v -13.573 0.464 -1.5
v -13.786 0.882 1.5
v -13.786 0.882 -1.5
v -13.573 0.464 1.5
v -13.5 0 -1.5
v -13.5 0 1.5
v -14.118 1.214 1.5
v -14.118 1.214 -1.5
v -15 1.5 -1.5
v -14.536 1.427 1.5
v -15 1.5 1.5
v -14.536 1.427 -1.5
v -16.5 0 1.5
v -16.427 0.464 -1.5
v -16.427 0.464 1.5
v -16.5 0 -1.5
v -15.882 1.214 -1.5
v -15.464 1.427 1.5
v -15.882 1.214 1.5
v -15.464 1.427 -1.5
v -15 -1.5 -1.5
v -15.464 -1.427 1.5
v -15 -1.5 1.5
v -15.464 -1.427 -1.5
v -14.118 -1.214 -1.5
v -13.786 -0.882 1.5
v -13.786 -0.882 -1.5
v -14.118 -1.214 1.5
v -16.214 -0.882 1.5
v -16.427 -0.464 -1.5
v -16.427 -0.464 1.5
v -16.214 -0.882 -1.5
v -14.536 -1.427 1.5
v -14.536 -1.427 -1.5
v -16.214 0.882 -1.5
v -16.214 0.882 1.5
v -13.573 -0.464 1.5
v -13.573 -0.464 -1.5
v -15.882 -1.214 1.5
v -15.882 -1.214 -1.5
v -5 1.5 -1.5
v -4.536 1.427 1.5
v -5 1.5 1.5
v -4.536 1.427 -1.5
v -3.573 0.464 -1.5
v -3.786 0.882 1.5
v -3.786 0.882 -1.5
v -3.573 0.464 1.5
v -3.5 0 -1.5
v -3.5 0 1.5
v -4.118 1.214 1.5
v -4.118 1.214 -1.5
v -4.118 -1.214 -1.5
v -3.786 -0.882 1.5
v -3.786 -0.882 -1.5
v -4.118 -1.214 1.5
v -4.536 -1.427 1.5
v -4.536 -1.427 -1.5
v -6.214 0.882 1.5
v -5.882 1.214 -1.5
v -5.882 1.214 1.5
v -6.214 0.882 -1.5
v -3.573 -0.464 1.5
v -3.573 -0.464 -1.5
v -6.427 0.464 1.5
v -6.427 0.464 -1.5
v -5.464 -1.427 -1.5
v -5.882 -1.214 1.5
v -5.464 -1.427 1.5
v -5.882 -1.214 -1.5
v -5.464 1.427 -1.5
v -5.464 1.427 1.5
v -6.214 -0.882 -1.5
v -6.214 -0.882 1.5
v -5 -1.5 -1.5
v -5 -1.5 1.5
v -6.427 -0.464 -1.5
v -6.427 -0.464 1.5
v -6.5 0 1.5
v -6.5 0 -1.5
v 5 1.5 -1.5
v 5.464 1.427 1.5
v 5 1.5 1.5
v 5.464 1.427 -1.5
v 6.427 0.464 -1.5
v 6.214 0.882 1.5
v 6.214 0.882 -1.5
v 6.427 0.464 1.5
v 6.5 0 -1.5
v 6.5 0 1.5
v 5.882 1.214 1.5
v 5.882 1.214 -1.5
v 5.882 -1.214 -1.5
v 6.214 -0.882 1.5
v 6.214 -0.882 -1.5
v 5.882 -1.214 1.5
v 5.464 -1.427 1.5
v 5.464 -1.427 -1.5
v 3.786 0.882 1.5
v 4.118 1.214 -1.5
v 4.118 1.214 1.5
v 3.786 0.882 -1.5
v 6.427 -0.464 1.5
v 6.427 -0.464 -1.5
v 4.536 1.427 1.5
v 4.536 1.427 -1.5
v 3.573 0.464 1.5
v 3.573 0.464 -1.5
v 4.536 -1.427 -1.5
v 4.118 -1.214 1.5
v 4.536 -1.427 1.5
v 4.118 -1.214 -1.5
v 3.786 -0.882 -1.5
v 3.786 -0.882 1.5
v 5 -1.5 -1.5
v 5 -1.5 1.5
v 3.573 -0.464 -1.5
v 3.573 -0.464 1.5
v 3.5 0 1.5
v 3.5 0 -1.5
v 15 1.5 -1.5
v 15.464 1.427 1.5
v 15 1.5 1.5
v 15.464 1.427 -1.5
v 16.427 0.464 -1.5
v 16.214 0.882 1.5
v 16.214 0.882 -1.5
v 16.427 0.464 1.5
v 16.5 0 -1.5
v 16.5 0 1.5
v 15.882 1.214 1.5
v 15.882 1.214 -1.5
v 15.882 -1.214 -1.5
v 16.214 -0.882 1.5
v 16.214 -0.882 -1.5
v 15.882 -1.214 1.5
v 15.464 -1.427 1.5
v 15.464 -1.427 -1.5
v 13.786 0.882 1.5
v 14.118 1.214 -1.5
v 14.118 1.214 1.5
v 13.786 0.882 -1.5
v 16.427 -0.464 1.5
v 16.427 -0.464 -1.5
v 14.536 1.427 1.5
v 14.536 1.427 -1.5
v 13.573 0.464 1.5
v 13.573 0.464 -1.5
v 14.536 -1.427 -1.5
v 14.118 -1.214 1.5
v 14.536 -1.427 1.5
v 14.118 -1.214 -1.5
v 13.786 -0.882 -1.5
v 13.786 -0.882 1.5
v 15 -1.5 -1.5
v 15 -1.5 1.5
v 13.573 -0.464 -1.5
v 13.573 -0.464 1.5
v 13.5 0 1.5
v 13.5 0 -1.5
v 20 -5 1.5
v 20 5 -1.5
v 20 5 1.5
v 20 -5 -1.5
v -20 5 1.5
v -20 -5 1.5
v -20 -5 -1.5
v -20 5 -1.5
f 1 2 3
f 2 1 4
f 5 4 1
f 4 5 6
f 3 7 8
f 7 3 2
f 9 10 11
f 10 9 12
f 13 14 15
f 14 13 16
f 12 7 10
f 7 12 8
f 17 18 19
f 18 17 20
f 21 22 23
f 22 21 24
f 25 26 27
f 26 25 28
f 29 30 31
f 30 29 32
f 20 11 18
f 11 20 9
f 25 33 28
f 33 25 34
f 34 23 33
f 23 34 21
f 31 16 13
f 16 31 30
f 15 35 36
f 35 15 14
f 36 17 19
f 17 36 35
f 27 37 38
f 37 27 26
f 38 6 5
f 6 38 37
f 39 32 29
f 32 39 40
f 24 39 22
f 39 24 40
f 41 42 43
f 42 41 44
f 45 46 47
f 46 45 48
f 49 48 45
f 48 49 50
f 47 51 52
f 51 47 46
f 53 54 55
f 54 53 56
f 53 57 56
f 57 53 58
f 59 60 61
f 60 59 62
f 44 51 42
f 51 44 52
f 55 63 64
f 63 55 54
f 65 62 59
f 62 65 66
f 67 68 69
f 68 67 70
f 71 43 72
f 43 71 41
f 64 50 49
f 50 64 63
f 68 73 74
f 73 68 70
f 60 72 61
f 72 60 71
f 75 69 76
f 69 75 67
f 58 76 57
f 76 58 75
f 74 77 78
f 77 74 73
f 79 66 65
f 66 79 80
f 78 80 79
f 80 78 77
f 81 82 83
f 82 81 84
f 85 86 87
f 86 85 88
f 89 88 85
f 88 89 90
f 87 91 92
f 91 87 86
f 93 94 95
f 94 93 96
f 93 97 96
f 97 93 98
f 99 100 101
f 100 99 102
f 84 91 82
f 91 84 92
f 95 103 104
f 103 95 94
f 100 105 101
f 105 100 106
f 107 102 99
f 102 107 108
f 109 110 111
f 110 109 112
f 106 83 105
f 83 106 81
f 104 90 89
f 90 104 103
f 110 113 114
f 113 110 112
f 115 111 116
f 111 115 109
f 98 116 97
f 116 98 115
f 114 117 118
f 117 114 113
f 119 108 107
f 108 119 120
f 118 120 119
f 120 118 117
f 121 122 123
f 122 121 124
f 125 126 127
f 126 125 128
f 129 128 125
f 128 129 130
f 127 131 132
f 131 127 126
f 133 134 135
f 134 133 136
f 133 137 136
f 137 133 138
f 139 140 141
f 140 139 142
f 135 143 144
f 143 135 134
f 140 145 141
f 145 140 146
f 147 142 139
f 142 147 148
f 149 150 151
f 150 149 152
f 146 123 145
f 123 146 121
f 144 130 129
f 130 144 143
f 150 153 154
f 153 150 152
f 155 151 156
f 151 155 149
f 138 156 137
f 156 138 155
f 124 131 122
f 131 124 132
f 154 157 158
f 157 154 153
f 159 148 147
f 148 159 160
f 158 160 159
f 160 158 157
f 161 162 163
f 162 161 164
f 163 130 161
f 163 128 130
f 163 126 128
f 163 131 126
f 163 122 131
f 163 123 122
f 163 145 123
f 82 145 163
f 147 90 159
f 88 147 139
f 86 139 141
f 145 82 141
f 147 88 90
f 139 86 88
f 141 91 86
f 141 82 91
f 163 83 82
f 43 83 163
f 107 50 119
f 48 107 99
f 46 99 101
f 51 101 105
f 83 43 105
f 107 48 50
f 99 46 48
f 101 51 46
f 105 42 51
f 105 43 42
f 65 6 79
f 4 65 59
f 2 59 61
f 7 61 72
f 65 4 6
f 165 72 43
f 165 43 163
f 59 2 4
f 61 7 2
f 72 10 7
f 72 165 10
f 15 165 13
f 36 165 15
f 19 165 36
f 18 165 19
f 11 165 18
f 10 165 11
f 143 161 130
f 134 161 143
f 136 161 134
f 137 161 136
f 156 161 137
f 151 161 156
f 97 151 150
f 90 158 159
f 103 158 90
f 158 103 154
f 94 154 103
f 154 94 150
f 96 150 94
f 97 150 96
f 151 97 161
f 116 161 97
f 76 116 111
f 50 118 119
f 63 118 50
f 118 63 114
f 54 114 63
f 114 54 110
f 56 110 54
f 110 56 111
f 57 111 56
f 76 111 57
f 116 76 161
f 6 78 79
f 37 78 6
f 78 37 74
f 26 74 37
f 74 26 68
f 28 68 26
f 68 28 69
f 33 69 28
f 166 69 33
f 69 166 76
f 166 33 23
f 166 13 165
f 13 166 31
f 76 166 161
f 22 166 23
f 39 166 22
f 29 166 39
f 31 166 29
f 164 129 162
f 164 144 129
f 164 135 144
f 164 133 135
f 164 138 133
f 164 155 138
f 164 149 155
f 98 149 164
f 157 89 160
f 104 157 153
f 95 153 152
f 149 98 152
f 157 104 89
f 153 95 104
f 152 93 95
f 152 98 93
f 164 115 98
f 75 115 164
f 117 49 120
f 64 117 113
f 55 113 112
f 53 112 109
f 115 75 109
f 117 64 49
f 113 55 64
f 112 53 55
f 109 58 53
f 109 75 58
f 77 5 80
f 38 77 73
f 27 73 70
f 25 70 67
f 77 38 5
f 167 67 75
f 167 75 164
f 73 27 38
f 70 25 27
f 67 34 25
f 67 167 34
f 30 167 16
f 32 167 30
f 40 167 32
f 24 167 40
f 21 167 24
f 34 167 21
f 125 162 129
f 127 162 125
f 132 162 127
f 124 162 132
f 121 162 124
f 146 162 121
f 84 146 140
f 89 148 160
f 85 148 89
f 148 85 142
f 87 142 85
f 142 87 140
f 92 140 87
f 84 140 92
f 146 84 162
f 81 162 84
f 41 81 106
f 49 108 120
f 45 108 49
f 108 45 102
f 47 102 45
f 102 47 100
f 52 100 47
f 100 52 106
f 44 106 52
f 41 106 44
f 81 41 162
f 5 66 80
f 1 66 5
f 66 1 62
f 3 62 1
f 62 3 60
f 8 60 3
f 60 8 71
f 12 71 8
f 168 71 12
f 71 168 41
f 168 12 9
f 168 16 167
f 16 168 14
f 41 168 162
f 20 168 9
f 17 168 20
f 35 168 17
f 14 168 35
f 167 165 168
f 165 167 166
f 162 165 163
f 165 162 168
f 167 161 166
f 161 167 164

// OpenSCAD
//Hole size
drill=3;
//Distance between holes
d=10;
//Number of holes
n=4;

lx=n*d;
anchura=10;
grosor=3;

difference(){
    //-- Cuerpo de la pieza
    cube([lx,anchura,grosor],center=true);
    
    //-- Taladros
    translate([-lx/2+d/2,0,0])
        for(i=[0:n-1]){
            translate([i*d,0,0])
                cylinder(r=drill/2,h=grosor+5,$fn=20,center=true);
    }
}
